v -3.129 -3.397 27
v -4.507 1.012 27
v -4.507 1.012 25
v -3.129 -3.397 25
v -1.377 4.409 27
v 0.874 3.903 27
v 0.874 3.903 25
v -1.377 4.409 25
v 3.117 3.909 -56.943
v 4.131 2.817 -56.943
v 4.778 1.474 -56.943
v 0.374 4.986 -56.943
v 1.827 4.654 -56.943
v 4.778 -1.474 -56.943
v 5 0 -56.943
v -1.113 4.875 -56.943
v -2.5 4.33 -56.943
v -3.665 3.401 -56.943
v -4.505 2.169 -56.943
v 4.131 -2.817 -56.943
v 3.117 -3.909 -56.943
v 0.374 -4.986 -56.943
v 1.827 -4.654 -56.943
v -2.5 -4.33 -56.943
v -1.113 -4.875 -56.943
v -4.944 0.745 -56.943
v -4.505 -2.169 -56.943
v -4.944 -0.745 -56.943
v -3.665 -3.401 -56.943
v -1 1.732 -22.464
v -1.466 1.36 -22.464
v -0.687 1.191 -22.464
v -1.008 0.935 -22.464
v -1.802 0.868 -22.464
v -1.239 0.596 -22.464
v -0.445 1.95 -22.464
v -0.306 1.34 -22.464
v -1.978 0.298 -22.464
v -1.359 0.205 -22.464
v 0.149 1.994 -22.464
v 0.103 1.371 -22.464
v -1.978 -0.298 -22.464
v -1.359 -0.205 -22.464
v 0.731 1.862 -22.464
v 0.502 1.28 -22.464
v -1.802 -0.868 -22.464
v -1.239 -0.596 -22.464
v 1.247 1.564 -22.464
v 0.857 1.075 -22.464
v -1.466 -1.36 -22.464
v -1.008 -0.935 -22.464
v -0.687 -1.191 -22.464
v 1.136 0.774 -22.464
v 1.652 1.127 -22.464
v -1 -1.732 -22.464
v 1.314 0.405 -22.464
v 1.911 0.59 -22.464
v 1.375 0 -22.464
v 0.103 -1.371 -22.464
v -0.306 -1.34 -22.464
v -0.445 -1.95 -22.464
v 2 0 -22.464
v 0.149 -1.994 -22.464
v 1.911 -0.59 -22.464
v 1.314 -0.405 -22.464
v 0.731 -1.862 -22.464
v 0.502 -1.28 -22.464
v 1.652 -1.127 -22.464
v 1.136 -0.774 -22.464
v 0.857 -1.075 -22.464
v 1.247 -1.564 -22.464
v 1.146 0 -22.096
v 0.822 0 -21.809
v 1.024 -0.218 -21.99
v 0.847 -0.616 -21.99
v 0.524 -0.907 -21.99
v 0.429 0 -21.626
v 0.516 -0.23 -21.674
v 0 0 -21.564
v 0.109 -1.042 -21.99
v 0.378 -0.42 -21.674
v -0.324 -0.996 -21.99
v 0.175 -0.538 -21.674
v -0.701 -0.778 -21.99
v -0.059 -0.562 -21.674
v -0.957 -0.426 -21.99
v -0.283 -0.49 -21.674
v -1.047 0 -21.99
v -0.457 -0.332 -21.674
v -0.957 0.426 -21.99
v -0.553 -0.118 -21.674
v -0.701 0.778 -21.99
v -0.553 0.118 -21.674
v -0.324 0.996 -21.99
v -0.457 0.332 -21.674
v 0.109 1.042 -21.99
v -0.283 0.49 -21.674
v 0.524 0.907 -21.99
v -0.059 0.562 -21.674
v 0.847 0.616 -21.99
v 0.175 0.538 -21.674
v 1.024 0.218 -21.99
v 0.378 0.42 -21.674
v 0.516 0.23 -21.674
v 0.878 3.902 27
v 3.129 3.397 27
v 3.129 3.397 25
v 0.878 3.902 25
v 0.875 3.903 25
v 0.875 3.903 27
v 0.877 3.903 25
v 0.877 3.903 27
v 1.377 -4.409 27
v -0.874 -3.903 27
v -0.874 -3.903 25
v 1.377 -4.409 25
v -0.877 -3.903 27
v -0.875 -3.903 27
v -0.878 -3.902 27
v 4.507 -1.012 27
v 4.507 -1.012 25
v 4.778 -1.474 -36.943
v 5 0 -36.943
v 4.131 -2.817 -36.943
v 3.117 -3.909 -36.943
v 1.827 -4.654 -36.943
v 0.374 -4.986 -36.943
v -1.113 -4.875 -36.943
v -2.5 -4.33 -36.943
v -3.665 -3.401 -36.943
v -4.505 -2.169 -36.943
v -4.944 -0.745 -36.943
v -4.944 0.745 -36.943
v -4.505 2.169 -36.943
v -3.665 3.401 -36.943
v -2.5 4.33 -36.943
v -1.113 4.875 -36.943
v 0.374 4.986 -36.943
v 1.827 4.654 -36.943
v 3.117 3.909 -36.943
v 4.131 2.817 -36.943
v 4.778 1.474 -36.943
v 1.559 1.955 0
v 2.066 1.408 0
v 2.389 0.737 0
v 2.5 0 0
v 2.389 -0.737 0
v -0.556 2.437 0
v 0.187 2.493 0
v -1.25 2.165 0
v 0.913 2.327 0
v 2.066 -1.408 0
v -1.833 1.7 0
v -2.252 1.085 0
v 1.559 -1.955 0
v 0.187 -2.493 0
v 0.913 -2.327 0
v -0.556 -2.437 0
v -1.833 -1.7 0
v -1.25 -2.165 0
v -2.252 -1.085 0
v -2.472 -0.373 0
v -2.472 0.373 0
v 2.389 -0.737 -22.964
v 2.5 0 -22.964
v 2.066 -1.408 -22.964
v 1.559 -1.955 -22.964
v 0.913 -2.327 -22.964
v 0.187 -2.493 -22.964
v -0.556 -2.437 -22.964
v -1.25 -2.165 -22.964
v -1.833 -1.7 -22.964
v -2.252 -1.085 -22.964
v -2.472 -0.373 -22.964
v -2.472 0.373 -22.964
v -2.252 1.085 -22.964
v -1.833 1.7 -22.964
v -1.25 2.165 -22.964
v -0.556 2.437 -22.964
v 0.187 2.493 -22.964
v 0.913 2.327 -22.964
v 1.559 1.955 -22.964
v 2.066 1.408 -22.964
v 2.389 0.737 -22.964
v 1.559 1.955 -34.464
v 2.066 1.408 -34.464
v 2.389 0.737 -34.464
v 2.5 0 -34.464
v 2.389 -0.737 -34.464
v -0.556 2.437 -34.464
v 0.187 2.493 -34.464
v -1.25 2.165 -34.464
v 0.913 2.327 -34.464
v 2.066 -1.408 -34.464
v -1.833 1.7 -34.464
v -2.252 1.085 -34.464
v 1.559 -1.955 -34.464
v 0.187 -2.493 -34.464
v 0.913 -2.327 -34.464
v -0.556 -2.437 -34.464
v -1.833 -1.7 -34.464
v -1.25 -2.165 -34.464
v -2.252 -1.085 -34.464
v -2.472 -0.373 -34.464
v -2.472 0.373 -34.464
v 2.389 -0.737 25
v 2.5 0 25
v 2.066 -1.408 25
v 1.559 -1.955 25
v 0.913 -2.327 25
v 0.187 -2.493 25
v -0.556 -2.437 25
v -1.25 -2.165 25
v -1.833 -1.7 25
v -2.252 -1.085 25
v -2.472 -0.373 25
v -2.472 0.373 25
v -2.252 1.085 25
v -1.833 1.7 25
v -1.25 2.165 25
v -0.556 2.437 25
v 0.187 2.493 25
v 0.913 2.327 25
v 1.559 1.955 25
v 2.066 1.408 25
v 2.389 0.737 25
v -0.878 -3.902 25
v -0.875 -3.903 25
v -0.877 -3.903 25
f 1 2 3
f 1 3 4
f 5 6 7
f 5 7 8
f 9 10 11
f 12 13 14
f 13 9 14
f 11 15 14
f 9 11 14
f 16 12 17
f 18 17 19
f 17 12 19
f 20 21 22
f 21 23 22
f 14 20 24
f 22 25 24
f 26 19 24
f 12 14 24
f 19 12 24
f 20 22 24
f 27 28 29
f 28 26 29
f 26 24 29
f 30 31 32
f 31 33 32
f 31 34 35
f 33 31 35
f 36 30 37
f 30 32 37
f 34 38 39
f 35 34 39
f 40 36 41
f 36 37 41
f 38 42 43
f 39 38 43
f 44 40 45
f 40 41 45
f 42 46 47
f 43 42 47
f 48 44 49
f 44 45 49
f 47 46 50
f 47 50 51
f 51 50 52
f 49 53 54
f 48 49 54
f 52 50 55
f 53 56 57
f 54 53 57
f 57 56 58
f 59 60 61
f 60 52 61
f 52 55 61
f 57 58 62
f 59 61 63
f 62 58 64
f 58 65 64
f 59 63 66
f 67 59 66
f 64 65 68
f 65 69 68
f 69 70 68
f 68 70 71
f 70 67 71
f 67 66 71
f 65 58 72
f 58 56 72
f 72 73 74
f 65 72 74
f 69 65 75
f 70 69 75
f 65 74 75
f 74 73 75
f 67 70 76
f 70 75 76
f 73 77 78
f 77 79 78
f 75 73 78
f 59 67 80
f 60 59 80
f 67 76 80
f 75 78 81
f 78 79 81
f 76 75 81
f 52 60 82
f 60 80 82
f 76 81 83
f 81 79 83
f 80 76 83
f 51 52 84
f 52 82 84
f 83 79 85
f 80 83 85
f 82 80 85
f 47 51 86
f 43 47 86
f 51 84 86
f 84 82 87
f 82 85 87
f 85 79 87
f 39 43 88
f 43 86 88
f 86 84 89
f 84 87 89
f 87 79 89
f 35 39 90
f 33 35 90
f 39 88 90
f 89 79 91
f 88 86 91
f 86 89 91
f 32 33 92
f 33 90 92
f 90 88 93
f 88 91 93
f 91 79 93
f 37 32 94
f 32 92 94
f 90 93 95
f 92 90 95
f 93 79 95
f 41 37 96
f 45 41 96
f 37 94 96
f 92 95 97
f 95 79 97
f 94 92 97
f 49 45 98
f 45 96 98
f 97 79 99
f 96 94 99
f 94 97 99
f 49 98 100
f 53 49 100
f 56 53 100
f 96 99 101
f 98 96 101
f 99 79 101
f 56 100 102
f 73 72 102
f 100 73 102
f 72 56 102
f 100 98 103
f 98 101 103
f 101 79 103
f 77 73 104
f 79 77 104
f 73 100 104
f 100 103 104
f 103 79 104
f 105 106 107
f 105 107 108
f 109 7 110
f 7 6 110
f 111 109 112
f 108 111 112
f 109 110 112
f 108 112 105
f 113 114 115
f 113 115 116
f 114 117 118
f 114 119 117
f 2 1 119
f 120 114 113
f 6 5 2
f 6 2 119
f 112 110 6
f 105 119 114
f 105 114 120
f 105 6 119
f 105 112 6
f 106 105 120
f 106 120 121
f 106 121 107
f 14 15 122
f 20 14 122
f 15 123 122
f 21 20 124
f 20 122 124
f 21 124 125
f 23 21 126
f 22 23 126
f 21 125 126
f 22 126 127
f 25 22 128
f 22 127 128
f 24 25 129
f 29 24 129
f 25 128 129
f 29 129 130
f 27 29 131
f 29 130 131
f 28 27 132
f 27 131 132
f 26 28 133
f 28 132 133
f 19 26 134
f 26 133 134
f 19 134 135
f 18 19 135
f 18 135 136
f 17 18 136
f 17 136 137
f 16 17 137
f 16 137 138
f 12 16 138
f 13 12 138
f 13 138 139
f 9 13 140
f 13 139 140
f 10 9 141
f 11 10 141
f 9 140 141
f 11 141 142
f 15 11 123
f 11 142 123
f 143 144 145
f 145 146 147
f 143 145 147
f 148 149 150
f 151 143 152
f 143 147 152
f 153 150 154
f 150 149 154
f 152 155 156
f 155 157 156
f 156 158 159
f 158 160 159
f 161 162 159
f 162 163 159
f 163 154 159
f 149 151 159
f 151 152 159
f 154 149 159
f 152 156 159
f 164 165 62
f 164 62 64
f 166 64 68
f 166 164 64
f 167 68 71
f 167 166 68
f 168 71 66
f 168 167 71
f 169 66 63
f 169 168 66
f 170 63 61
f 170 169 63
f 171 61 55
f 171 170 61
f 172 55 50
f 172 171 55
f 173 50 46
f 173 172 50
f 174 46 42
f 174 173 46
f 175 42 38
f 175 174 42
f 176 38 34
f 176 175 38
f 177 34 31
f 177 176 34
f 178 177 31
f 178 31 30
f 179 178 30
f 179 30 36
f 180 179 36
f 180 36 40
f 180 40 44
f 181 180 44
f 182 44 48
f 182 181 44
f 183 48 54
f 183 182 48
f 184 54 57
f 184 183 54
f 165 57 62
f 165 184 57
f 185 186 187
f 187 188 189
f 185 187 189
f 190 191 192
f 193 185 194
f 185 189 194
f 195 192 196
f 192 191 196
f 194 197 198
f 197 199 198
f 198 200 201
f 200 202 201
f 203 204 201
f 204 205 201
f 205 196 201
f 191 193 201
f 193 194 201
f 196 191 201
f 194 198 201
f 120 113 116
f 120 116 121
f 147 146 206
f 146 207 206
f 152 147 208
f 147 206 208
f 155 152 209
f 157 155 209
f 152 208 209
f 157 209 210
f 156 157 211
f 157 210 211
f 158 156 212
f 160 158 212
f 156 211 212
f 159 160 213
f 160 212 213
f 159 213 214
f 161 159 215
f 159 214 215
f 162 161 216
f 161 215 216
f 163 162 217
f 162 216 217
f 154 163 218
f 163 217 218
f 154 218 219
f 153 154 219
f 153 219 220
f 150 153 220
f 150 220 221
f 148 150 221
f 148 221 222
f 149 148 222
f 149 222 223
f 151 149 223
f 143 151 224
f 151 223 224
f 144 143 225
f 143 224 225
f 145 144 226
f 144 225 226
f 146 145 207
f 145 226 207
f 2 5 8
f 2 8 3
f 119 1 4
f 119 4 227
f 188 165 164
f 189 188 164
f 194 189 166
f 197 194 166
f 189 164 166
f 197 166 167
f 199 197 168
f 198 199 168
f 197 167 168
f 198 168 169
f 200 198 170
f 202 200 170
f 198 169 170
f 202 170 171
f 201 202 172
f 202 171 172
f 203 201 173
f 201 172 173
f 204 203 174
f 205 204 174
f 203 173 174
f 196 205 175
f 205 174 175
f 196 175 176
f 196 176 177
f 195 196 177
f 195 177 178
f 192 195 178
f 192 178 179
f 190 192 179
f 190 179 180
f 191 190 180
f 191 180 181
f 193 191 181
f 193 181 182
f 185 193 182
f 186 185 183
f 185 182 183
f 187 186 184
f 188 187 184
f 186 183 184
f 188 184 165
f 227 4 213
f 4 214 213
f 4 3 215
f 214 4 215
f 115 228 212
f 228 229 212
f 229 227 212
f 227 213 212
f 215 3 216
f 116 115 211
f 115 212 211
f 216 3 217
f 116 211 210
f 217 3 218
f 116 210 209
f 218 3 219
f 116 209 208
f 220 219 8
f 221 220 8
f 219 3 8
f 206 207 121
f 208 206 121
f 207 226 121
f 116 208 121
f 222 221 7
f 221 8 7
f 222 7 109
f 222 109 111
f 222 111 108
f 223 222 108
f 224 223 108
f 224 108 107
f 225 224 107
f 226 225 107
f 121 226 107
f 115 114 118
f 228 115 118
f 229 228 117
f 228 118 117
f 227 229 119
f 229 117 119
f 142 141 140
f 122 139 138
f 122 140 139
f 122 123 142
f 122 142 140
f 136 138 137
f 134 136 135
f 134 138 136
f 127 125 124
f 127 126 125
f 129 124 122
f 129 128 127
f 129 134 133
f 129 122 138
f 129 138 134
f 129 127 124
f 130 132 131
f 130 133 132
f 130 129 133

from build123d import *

# Parameters (mm, degrees)
F0_W     = 5
F0_H     = 20
F3_DEPTH = 2
F4_SIZE  = 0.5


with BuildPart() as f1:
    # F0 (on Front) → F1 (revolve)
    with BuildSketch(Plane.XZ):
        Polygon((0, 27), (0, 0), (2.5, 0), (2.5, 25), (4, 25), (4, 27), align=None)
        with BuildLine():
            Line((2.5, -22.463812), (1.374773, -22.463812))
            ThreePointArc((1.374773, -22.463812), (0.821584, -21.808822), (0, -21.563812))
            Line((0, -21.563812), (0, -22.463812))
            Line((0, -22.463812), (0, -34.463812))
            Line((0, -34.463812), (2.5, -34.463812))
            Line((2.5, -34.463812), (2.5, -22.463812))
        make_face()
        with Locations((2.5, -46.942504)):
            Rectangle(F0_W, F0_H)
    revolve(axis=Axis((0, 0, 13.5), (0, 0, -1)))

    # F2 (on face) → F3 (join)
    with BuildSketch(Plane.XY.offset(27)):
        Polygon((1.377257, -4.408684), (4.506661, -1.011603), (3.129404, 3.397081), (-1.377257, 4.408684), (-4.506661, 1.011603), (-3.129404, -3.397081), align=None)
    extrude(amount=-F3_DEPTH)

    # F4
    f4_edges = [f1.edges().sort_by_distance(p)[0] for p in [
        (-2.5, 0, -22.463812),
    ]]
    chamfer(f4_edges, length=F4_SIZE)


solid = f1.part
